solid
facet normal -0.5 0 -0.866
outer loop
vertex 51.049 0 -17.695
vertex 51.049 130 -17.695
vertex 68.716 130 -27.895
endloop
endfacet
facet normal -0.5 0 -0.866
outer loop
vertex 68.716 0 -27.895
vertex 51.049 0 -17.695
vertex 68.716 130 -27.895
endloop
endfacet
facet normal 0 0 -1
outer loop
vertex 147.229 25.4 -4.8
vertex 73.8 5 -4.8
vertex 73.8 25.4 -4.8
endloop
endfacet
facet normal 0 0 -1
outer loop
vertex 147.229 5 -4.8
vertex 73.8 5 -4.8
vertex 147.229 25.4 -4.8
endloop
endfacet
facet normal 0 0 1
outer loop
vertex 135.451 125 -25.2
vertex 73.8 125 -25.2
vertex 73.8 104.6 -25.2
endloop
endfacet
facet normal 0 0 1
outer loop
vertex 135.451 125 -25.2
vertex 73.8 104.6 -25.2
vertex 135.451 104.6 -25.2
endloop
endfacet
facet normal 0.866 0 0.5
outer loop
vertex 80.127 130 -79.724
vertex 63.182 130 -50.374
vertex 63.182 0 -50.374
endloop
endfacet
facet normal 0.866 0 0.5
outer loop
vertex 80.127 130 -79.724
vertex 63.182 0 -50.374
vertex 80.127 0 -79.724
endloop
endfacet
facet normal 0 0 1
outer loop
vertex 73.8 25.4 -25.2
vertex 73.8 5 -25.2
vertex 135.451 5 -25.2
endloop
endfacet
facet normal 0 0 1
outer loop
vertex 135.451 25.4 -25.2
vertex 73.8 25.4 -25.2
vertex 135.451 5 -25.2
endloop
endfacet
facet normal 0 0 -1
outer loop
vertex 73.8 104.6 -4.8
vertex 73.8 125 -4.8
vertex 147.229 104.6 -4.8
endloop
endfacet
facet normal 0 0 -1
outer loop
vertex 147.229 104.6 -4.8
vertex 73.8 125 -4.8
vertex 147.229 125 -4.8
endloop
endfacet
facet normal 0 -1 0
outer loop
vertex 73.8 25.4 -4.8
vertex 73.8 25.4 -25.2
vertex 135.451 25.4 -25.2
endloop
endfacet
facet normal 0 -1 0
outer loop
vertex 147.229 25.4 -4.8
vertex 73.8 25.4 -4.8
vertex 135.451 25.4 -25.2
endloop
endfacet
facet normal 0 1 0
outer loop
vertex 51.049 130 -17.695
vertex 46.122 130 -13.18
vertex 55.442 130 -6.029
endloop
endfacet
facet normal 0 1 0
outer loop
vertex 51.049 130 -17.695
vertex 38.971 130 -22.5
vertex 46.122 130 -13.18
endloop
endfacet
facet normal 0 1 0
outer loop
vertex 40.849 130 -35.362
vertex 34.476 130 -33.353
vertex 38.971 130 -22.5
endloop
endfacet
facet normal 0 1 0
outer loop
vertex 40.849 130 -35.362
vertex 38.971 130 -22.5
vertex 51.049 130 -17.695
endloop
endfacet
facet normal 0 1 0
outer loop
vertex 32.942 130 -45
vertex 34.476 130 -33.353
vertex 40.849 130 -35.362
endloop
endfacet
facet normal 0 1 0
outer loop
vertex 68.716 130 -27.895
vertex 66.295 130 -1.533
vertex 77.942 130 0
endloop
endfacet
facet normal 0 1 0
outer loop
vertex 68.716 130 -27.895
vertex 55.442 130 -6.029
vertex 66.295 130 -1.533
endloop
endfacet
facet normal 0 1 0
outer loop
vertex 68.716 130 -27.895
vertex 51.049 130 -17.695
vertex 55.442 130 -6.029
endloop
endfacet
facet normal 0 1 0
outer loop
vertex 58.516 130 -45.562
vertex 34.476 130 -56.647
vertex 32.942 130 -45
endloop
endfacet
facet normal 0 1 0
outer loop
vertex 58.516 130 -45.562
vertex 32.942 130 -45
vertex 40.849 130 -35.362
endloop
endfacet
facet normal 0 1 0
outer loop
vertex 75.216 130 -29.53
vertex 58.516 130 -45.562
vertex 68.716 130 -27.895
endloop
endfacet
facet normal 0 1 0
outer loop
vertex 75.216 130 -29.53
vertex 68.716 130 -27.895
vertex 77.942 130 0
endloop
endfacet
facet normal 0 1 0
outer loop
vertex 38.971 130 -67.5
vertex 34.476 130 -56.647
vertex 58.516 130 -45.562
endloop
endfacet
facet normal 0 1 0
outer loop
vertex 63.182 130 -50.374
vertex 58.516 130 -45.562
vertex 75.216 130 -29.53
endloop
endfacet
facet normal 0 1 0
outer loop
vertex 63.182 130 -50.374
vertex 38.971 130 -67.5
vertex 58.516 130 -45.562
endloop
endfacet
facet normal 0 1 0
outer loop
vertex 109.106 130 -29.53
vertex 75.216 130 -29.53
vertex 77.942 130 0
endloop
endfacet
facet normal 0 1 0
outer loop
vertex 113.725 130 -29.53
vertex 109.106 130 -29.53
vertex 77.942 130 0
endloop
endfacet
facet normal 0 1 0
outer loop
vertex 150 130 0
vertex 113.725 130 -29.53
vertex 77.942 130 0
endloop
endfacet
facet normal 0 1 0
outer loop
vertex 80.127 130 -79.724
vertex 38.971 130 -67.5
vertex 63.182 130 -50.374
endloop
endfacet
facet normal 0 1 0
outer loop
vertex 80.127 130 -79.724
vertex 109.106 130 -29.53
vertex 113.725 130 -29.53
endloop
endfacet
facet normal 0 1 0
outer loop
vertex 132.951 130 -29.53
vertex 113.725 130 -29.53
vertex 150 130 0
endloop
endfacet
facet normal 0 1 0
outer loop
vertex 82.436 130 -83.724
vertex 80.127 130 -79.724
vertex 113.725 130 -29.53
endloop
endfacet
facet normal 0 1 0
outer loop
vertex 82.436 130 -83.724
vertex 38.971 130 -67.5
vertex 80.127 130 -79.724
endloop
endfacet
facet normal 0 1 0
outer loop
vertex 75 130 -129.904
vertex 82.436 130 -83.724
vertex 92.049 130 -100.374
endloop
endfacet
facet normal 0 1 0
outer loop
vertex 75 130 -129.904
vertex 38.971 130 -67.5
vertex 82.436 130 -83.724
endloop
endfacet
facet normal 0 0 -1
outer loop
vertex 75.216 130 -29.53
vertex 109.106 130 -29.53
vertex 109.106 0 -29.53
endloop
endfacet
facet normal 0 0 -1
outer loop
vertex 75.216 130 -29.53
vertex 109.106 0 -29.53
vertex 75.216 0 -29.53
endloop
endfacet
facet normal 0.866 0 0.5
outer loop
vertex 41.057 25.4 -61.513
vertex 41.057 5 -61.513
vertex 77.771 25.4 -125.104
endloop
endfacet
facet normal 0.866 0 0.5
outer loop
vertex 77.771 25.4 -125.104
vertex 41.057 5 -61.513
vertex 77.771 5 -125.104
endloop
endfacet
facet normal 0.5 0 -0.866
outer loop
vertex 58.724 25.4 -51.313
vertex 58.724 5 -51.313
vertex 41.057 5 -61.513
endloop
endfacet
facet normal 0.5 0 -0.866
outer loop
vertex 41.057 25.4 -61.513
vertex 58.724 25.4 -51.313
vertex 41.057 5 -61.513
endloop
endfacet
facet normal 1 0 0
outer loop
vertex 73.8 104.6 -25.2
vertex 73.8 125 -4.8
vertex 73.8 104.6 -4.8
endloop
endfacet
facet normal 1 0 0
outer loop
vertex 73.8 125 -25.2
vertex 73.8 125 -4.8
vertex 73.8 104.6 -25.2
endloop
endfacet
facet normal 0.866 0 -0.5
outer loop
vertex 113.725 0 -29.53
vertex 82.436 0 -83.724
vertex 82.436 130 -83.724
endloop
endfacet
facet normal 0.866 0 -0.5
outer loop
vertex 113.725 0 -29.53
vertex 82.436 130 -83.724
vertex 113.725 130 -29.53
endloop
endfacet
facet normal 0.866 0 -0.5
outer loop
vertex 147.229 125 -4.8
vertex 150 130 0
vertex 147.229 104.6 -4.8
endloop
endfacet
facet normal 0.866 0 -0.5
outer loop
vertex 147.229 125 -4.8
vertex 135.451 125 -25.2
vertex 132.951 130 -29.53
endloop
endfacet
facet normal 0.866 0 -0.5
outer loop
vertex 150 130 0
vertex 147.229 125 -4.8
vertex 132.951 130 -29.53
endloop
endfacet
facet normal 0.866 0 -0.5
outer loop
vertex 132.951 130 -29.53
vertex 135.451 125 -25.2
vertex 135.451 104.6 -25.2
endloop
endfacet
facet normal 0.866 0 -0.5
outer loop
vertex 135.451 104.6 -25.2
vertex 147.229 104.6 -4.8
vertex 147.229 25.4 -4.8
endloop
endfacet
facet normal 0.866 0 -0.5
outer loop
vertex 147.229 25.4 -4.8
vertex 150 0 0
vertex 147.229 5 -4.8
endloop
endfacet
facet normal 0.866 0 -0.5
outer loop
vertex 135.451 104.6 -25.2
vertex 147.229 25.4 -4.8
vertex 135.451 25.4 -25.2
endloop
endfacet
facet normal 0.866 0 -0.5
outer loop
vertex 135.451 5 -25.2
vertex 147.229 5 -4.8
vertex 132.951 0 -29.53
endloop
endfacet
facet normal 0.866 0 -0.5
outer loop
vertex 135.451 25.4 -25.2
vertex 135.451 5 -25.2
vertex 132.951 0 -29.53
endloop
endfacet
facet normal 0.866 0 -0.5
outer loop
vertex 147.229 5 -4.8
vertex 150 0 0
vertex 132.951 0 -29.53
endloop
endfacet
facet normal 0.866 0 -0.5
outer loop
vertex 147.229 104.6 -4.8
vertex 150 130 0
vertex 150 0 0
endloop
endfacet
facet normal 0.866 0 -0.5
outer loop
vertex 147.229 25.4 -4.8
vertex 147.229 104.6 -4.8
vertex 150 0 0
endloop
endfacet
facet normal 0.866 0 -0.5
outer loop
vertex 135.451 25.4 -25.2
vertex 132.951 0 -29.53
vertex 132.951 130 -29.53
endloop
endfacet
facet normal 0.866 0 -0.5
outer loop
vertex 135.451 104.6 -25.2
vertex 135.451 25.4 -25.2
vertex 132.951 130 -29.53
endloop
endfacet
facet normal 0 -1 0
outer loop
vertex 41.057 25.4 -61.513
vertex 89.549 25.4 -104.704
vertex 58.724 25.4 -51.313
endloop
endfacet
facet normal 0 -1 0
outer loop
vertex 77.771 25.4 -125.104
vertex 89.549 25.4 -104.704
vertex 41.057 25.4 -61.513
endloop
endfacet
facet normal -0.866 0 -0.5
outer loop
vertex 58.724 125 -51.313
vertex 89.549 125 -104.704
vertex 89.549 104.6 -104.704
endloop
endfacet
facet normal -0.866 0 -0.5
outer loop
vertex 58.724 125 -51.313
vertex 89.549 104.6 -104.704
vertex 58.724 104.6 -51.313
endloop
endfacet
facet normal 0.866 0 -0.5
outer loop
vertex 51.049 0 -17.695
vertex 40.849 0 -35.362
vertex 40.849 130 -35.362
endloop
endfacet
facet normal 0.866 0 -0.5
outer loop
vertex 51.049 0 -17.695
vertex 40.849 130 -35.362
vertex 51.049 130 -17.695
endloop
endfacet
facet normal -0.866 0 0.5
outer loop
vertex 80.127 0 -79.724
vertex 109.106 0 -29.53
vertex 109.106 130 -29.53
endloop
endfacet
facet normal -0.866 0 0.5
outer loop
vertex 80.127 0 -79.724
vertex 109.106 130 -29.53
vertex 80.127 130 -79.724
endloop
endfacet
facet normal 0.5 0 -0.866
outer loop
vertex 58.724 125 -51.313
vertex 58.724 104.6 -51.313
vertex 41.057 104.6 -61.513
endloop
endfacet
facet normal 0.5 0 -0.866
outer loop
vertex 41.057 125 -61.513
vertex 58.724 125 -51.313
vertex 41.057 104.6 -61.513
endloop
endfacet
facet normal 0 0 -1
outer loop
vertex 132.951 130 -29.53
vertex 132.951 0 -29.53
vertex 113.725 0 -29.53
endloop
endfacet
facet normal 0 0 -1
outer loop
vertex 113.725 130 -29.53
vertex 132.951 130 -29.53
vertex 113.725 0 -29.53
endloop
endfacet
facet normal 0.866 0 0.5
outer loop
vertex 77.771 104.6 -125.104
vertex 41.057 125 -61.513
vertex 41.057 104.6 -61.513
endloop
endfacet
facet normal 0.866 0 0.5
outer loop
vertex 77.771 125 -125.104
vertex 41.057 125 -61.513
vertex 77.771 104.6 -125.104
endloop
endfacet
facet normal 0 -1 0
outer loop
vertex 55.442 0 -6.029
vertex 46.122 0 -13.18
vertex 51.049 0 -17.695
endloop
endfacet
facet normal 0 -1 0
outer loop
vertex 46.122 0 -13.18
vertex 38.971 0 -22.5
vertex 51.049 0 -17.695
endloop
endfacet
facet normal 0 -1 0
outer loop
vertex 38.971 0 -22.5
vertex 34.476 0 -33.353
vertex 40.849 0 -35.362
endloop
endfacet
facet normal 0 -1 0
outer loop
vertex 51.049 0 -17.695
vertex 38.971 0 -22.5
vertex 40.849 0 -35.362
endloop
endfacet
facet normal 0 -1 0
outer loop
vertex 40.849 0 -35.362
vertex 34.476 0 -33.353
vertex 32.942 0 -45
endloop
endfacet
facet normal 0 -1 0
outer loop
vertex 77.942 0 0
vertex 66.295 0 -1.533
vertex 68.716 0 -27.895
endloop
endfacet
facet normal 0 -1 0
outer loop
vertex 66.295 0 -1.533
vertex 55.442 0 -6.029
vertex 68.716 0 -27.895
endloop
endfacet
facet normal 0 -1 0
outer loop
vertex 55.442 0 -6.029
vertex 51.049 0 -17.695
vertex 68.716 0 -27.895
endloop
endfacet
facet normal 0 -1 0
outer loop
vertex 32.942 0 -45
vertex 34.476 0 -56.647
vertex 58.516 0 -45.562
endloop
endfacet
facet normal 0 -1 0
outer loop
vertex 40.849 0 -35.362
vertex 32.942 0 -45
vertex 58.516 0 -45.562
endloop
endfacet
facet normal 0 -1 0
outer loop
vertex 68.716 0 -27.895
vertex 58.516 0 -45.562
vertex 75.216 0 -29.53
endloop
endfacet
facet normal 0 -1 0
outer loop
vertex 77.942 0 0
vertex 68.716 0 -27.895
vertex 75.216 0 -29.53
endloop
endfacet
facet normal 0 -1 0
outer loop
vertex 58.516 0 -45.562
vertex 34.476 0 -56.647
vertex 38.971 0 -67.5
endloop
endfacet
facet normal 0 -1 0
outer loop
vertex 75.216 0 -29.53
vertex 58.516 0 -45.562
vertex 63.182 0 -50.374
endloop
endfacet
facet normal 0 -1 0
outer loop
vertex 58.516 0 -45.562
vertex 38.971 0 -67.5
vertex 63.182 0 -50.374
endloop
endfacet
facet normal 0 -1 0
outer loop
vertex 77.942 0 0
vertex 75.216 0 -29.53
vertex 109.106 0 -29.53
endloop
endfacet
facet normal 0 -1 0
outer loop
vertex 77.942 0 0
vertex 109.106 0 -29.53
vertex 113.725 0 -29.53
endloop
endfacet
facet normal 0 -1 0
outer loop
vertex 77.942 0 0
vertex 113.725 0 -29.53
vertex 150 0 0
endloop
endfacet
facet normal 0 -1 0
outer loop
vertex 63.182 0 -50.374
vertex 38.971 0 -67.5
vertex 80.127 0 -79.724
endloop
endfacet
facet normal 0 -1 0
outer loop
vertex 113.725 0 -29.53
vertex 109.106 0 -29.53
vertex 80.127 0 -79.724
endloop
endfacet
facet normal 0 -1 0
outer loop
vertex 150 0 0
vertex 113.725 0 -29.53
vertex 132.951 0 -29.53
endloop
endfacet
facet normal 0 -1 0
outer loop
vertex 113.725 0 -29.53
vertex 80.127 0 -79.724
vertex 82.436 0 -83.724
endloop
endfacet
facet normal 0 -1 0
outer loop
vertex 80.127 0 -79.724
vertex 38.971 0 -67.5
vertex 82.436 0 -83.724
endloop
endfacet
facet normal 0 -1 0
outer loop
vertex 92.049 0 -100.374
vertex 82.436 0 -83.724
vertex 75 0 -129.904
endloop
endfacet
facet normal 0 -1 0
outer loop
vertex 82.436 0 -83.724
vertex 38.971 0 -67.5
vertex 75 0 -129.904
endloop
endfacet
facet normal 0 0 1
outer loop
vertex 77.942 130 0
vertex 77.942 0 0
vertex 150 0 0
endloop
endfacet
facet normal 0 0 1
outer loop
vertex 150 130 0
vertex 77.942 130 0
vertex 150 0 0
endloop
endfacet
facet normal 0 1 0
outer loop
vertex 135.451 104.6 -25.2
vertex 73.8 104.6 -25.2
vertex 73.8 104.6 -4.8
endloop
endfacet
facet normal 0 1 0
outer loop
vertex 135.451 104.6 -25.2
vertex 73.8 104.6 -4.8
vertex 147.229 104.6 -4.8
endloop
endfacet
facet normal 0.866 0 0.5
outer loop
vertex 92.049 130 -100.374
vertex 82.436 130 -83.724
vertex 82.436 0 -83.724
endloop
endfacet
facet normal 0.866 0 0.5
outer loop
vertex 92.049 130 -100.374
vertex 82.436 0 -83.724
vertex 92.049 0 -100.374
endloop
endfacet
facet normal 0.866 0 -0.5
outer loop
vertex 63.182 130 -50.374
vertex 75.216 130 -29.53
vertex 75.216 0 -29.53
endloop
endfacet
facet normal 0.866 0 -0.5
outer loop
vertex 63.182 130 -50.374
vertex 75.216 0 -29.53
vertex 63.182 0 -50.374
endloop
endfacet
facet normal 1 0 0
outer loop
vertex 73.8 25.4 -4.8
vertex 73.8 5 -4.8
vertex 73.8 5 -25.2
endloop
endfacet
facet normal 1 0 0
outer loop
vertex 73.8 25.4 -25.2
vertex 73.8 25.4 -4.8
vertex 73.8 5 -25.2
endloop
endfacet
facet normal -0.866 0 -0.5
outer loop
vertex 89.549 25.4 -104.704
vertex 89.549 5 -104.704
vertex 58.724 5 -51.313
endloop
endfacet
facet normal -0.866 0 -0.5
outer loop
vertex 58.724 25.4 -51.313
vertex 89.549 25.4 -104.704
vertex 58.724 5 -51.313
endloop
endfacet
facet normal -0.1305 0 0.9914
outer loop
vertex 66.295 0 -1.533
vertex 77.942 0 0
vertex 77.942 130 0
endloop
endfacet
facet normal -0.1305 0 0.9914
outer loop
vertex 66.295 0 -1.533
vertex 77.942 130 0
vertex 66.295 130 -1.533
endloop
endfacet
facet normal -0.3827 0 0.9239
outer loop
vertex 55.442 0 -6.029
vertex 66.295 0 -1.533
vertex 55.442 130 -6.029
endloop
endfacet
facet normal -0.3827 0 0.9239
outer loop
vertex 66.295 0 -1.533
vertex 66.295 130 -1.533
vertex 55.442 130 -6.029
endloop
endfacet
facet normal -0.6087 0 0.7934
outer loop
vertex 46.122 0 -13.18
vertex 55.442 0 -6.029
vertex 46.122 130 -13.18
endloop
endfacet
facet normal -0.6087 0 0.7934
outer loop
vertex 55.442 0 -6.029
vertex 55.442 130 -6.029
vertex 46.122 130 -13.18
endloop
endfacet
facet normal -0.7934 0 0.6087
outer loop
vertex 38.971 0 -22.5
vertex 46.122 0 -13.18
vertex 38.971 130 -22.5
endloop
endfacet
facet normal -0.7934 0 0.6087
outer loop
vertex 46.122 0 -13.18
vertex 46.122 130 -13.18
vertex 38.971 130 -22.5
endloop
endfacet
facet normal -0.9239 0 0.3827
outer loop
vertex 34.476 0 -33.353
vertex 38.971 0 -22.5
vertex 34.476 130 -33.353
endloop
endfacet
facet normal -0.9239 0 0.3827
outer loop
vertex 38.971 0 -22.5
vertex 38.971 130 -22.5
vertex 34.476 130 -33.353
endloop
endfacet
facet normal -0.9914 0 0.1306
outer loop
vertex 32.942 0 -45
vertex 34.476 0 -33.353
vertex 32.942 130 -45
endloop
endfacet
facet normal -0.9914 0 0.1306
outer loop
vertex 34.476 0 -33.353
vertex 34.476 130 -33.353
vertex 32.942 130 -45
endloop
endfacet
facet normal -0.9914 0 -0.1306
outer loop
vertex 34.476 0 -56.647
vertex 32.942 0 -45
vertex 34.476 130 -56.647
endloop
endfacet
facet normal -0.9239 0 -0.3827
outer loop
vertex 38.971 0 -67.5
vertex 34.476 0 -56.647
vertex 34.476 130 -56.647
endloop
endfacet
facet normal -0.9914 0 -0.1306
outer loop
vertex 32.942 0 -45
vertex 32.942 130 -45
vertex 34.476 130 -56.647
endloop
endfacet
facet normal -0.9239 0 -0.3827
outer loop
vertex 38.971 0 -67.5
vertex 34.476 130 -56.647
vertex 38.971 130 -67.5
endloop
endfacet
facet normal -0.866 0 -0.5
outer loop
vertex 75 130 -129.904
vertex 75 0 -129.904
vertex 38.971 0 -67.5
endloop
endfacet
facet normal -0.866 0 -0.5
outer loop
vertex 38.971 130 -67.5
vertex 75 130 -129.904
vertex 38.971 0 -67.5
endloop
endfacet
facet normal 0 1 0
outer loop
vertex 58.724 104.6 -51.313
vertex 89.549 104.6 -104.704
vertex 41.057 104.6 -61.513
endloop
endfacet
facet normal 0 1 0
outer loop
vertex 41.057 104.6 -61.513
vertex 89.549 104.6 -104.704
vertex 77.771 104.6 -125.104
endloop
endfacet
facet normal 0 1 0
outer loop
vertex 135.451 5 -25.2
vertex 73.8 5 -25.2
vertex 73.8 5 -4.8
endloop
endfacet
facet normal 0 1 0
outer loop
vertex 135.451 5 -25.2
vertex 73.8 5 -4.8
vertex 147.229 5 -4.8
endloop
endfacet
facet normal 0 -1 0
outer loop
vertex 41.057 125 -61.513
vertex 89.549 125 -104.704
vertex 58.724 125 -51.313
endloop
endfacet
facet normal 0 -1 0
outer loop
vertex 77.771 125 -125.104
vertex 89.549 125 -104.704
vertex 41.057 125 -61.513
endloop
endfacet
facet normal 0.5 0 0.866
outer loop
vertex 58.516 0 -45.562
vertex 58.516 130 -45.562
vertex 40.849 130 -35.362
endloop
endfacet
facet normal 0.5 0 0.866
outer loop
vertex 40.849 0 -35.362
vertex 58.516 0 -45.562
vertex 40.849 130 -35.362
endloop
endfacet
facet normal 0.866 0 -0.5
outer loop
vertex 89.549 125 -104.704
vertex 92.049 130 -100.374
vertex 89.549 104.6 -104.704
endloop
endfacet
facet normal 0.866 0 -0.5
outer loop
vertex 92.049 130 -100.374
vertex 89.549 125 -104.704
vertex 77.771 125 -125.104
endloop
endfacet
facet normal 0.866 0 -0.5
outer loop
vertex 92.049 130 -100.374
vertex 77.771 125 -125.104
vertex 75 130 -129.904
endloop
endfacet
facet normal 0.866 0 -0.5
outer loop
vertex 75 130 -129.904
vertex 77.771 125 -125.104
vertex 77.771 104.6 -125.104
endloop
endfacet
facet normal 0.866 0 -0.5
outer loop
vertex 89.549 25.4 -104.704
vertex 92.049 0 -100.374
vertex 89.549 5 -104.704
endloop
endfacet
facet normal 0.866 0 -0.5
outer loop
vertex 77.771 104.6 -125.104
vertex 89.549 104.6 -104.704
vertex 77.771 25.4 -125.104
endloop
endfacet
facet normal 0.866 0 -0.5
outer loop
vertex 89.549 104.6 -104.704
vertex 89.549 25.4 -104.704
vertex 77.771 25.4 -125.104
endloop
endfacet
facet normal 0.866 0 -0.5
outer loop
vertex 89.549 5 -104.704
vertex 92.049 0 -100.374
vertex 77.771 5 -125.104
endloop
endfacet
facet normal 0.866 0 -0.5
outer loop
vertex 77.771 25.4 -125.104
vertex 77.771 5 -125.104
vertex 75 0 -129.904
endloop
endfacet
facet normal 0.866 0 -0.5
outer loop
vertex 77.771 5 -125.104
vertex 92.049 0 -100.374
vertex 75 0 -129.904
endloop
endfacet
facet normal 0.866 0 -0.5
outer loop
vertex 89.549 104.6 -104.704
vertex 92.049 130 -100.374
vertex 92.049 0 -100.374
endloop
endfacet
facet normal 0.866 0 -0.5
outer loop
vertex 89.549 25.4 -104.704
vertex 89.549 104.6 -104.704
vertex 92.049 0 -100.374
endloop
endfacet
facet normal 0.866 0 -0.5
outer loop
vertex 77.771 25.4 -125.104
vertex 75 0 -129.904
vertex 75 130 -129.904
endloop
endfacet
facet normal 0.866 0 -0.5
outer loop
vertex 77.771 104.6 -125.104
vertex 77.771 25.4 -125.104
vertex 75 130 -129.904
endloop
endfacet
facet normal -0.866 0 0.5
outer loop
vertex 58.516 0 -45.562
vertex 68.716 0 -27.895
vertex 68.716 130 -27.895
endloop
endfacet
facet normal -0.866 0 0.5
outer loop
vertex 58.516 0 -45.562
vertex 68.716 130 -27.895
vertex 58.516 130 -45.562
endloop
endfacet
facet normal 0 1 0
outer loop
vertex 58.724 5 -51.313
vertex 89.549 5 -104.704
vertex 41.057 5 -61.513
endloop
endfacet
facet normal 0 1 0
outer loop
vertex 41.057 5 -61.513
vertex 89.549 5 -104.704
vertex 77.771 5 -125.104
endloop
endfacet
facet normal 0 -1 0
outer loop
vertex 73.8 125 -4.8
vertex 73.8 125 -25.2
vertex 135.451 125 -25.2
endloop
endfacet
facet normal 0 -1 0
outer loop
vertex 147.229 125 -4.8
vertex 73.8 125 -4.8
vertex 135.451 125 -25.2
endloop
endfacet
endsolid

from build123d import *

# Parameters (mm, degrees)
BOSS_EXTRUDE1_DEPTH     = 130
SKETCH2_W               = 100.4
SKETCH2_H               = 20.4
CUT_EXTRUDE2_DEPTH      = 20.4
CUT_EXTRUDE3_DEPTH      = 238.223523286
FILLET1_R               = 45
CUT_EXTRUDE4_DEPTH      = 238.223523286
CUT_EXTRUDE4_DEPTH_BACK = 238.223523286
BOSS_EXTRUDE2_DEPTH     = 130


with BuildPart() as part:
    # Sketch1 → Boss-Extrude1 (new body)
    with BuildSketch(Plane(origin=(0, 0, 0), x_dir=(1, 0, 0), z_dir=(0, 1, 0))):
        Polygon((0, 0), (150, 0), (75, 129.903810568), align=None)
    extrude(amount=BOSS_EXTRUDE1_DEPTH)

    # Sketch2 → Cut-Extrude2 (cut)
    with BuildSketch(Plane(origin=(0, 5, 0), x_dir=(1, 0, 0), z_dir=(0, 1, 0))):
        Polygon((108.923840175, 138.261625339), (58.723840175, 51.312674799), (41.056921938, 61.512674799), (91.256921938, 148.461625339), align=None)
        with Locations((124, 15)):
            Rectangle(SKETCH2_W, SKETCH2_H)
    cut_extrude2 = extrude(amount=CUT_EXTRUDE2_DEPTH, mode=Mode.SUBTRACT)

    # Mirror1: Cut-Extrude2 across plane
    add(cut_extrude2.mirror(Plane.ZX.offset(65)), mode=Mode.SUBTRACT)

    # Sketch4 → Cut-Extrude3 (cut, through all)
    with BuildSketch(Plane(origin=(0, 0, 0), x_dir=(1, 0, 0), z_dir=(0, 1, 0))):
        Polygon((58.515583945, 45.561933634), (40.848665708, 35.361933634), (51.048665708, 17.695015397), (68.715583945, 27.895015397), align=None)
    extrude(amount=CUT_EXTRUDE3_DEPTH, mode=Mode.SUBTRACT)

    # Fillet1
    fillet1_edges = [part.edges().sort_by_distance(p)[0] for p in [
        (0, 65, 0),
    ]]
    fillet(fillet1_edges, radius=FILLET1_R)

    # Sketch27 → Cut-Extrude4 (cut, two sides: drawn at the far end of the back side and taken through both)
    with BuildSketch(Plane.XZ.offset(-CUT_EXTRUDE4_DEPTH_BACK)):
        Polygon((426.334426918, -29.530127019), (132.950773216, -29.530127019), (75.215746297, -29.530127019), (63.181713324, -50.373683549), (92.049226784, -100.373683549), (238.741053634, -354.45138071), (746.896447956, -647.835034411), (934.48982124, -322.913780721), align=None)
    extrude(amount=CUT_EXTRUDE4_DEPTH + CUT_EXTRUDE4_DEPTH_BACK, mode=Mode.SUBTRACT)

    # Sketch28 → Boss-Extrude2 (add)
    with BuildSketch(Plane.XZ):
        Polygon((109.106207099, -29.530127019), (80.126943725, -79.723683549), (82.436344802, -83.723683549), (113.725009252, -29.530127019), align=None)
    extrude(amount=-BOSS_EXTRUDE2_DEPTH)


solid = part.part
